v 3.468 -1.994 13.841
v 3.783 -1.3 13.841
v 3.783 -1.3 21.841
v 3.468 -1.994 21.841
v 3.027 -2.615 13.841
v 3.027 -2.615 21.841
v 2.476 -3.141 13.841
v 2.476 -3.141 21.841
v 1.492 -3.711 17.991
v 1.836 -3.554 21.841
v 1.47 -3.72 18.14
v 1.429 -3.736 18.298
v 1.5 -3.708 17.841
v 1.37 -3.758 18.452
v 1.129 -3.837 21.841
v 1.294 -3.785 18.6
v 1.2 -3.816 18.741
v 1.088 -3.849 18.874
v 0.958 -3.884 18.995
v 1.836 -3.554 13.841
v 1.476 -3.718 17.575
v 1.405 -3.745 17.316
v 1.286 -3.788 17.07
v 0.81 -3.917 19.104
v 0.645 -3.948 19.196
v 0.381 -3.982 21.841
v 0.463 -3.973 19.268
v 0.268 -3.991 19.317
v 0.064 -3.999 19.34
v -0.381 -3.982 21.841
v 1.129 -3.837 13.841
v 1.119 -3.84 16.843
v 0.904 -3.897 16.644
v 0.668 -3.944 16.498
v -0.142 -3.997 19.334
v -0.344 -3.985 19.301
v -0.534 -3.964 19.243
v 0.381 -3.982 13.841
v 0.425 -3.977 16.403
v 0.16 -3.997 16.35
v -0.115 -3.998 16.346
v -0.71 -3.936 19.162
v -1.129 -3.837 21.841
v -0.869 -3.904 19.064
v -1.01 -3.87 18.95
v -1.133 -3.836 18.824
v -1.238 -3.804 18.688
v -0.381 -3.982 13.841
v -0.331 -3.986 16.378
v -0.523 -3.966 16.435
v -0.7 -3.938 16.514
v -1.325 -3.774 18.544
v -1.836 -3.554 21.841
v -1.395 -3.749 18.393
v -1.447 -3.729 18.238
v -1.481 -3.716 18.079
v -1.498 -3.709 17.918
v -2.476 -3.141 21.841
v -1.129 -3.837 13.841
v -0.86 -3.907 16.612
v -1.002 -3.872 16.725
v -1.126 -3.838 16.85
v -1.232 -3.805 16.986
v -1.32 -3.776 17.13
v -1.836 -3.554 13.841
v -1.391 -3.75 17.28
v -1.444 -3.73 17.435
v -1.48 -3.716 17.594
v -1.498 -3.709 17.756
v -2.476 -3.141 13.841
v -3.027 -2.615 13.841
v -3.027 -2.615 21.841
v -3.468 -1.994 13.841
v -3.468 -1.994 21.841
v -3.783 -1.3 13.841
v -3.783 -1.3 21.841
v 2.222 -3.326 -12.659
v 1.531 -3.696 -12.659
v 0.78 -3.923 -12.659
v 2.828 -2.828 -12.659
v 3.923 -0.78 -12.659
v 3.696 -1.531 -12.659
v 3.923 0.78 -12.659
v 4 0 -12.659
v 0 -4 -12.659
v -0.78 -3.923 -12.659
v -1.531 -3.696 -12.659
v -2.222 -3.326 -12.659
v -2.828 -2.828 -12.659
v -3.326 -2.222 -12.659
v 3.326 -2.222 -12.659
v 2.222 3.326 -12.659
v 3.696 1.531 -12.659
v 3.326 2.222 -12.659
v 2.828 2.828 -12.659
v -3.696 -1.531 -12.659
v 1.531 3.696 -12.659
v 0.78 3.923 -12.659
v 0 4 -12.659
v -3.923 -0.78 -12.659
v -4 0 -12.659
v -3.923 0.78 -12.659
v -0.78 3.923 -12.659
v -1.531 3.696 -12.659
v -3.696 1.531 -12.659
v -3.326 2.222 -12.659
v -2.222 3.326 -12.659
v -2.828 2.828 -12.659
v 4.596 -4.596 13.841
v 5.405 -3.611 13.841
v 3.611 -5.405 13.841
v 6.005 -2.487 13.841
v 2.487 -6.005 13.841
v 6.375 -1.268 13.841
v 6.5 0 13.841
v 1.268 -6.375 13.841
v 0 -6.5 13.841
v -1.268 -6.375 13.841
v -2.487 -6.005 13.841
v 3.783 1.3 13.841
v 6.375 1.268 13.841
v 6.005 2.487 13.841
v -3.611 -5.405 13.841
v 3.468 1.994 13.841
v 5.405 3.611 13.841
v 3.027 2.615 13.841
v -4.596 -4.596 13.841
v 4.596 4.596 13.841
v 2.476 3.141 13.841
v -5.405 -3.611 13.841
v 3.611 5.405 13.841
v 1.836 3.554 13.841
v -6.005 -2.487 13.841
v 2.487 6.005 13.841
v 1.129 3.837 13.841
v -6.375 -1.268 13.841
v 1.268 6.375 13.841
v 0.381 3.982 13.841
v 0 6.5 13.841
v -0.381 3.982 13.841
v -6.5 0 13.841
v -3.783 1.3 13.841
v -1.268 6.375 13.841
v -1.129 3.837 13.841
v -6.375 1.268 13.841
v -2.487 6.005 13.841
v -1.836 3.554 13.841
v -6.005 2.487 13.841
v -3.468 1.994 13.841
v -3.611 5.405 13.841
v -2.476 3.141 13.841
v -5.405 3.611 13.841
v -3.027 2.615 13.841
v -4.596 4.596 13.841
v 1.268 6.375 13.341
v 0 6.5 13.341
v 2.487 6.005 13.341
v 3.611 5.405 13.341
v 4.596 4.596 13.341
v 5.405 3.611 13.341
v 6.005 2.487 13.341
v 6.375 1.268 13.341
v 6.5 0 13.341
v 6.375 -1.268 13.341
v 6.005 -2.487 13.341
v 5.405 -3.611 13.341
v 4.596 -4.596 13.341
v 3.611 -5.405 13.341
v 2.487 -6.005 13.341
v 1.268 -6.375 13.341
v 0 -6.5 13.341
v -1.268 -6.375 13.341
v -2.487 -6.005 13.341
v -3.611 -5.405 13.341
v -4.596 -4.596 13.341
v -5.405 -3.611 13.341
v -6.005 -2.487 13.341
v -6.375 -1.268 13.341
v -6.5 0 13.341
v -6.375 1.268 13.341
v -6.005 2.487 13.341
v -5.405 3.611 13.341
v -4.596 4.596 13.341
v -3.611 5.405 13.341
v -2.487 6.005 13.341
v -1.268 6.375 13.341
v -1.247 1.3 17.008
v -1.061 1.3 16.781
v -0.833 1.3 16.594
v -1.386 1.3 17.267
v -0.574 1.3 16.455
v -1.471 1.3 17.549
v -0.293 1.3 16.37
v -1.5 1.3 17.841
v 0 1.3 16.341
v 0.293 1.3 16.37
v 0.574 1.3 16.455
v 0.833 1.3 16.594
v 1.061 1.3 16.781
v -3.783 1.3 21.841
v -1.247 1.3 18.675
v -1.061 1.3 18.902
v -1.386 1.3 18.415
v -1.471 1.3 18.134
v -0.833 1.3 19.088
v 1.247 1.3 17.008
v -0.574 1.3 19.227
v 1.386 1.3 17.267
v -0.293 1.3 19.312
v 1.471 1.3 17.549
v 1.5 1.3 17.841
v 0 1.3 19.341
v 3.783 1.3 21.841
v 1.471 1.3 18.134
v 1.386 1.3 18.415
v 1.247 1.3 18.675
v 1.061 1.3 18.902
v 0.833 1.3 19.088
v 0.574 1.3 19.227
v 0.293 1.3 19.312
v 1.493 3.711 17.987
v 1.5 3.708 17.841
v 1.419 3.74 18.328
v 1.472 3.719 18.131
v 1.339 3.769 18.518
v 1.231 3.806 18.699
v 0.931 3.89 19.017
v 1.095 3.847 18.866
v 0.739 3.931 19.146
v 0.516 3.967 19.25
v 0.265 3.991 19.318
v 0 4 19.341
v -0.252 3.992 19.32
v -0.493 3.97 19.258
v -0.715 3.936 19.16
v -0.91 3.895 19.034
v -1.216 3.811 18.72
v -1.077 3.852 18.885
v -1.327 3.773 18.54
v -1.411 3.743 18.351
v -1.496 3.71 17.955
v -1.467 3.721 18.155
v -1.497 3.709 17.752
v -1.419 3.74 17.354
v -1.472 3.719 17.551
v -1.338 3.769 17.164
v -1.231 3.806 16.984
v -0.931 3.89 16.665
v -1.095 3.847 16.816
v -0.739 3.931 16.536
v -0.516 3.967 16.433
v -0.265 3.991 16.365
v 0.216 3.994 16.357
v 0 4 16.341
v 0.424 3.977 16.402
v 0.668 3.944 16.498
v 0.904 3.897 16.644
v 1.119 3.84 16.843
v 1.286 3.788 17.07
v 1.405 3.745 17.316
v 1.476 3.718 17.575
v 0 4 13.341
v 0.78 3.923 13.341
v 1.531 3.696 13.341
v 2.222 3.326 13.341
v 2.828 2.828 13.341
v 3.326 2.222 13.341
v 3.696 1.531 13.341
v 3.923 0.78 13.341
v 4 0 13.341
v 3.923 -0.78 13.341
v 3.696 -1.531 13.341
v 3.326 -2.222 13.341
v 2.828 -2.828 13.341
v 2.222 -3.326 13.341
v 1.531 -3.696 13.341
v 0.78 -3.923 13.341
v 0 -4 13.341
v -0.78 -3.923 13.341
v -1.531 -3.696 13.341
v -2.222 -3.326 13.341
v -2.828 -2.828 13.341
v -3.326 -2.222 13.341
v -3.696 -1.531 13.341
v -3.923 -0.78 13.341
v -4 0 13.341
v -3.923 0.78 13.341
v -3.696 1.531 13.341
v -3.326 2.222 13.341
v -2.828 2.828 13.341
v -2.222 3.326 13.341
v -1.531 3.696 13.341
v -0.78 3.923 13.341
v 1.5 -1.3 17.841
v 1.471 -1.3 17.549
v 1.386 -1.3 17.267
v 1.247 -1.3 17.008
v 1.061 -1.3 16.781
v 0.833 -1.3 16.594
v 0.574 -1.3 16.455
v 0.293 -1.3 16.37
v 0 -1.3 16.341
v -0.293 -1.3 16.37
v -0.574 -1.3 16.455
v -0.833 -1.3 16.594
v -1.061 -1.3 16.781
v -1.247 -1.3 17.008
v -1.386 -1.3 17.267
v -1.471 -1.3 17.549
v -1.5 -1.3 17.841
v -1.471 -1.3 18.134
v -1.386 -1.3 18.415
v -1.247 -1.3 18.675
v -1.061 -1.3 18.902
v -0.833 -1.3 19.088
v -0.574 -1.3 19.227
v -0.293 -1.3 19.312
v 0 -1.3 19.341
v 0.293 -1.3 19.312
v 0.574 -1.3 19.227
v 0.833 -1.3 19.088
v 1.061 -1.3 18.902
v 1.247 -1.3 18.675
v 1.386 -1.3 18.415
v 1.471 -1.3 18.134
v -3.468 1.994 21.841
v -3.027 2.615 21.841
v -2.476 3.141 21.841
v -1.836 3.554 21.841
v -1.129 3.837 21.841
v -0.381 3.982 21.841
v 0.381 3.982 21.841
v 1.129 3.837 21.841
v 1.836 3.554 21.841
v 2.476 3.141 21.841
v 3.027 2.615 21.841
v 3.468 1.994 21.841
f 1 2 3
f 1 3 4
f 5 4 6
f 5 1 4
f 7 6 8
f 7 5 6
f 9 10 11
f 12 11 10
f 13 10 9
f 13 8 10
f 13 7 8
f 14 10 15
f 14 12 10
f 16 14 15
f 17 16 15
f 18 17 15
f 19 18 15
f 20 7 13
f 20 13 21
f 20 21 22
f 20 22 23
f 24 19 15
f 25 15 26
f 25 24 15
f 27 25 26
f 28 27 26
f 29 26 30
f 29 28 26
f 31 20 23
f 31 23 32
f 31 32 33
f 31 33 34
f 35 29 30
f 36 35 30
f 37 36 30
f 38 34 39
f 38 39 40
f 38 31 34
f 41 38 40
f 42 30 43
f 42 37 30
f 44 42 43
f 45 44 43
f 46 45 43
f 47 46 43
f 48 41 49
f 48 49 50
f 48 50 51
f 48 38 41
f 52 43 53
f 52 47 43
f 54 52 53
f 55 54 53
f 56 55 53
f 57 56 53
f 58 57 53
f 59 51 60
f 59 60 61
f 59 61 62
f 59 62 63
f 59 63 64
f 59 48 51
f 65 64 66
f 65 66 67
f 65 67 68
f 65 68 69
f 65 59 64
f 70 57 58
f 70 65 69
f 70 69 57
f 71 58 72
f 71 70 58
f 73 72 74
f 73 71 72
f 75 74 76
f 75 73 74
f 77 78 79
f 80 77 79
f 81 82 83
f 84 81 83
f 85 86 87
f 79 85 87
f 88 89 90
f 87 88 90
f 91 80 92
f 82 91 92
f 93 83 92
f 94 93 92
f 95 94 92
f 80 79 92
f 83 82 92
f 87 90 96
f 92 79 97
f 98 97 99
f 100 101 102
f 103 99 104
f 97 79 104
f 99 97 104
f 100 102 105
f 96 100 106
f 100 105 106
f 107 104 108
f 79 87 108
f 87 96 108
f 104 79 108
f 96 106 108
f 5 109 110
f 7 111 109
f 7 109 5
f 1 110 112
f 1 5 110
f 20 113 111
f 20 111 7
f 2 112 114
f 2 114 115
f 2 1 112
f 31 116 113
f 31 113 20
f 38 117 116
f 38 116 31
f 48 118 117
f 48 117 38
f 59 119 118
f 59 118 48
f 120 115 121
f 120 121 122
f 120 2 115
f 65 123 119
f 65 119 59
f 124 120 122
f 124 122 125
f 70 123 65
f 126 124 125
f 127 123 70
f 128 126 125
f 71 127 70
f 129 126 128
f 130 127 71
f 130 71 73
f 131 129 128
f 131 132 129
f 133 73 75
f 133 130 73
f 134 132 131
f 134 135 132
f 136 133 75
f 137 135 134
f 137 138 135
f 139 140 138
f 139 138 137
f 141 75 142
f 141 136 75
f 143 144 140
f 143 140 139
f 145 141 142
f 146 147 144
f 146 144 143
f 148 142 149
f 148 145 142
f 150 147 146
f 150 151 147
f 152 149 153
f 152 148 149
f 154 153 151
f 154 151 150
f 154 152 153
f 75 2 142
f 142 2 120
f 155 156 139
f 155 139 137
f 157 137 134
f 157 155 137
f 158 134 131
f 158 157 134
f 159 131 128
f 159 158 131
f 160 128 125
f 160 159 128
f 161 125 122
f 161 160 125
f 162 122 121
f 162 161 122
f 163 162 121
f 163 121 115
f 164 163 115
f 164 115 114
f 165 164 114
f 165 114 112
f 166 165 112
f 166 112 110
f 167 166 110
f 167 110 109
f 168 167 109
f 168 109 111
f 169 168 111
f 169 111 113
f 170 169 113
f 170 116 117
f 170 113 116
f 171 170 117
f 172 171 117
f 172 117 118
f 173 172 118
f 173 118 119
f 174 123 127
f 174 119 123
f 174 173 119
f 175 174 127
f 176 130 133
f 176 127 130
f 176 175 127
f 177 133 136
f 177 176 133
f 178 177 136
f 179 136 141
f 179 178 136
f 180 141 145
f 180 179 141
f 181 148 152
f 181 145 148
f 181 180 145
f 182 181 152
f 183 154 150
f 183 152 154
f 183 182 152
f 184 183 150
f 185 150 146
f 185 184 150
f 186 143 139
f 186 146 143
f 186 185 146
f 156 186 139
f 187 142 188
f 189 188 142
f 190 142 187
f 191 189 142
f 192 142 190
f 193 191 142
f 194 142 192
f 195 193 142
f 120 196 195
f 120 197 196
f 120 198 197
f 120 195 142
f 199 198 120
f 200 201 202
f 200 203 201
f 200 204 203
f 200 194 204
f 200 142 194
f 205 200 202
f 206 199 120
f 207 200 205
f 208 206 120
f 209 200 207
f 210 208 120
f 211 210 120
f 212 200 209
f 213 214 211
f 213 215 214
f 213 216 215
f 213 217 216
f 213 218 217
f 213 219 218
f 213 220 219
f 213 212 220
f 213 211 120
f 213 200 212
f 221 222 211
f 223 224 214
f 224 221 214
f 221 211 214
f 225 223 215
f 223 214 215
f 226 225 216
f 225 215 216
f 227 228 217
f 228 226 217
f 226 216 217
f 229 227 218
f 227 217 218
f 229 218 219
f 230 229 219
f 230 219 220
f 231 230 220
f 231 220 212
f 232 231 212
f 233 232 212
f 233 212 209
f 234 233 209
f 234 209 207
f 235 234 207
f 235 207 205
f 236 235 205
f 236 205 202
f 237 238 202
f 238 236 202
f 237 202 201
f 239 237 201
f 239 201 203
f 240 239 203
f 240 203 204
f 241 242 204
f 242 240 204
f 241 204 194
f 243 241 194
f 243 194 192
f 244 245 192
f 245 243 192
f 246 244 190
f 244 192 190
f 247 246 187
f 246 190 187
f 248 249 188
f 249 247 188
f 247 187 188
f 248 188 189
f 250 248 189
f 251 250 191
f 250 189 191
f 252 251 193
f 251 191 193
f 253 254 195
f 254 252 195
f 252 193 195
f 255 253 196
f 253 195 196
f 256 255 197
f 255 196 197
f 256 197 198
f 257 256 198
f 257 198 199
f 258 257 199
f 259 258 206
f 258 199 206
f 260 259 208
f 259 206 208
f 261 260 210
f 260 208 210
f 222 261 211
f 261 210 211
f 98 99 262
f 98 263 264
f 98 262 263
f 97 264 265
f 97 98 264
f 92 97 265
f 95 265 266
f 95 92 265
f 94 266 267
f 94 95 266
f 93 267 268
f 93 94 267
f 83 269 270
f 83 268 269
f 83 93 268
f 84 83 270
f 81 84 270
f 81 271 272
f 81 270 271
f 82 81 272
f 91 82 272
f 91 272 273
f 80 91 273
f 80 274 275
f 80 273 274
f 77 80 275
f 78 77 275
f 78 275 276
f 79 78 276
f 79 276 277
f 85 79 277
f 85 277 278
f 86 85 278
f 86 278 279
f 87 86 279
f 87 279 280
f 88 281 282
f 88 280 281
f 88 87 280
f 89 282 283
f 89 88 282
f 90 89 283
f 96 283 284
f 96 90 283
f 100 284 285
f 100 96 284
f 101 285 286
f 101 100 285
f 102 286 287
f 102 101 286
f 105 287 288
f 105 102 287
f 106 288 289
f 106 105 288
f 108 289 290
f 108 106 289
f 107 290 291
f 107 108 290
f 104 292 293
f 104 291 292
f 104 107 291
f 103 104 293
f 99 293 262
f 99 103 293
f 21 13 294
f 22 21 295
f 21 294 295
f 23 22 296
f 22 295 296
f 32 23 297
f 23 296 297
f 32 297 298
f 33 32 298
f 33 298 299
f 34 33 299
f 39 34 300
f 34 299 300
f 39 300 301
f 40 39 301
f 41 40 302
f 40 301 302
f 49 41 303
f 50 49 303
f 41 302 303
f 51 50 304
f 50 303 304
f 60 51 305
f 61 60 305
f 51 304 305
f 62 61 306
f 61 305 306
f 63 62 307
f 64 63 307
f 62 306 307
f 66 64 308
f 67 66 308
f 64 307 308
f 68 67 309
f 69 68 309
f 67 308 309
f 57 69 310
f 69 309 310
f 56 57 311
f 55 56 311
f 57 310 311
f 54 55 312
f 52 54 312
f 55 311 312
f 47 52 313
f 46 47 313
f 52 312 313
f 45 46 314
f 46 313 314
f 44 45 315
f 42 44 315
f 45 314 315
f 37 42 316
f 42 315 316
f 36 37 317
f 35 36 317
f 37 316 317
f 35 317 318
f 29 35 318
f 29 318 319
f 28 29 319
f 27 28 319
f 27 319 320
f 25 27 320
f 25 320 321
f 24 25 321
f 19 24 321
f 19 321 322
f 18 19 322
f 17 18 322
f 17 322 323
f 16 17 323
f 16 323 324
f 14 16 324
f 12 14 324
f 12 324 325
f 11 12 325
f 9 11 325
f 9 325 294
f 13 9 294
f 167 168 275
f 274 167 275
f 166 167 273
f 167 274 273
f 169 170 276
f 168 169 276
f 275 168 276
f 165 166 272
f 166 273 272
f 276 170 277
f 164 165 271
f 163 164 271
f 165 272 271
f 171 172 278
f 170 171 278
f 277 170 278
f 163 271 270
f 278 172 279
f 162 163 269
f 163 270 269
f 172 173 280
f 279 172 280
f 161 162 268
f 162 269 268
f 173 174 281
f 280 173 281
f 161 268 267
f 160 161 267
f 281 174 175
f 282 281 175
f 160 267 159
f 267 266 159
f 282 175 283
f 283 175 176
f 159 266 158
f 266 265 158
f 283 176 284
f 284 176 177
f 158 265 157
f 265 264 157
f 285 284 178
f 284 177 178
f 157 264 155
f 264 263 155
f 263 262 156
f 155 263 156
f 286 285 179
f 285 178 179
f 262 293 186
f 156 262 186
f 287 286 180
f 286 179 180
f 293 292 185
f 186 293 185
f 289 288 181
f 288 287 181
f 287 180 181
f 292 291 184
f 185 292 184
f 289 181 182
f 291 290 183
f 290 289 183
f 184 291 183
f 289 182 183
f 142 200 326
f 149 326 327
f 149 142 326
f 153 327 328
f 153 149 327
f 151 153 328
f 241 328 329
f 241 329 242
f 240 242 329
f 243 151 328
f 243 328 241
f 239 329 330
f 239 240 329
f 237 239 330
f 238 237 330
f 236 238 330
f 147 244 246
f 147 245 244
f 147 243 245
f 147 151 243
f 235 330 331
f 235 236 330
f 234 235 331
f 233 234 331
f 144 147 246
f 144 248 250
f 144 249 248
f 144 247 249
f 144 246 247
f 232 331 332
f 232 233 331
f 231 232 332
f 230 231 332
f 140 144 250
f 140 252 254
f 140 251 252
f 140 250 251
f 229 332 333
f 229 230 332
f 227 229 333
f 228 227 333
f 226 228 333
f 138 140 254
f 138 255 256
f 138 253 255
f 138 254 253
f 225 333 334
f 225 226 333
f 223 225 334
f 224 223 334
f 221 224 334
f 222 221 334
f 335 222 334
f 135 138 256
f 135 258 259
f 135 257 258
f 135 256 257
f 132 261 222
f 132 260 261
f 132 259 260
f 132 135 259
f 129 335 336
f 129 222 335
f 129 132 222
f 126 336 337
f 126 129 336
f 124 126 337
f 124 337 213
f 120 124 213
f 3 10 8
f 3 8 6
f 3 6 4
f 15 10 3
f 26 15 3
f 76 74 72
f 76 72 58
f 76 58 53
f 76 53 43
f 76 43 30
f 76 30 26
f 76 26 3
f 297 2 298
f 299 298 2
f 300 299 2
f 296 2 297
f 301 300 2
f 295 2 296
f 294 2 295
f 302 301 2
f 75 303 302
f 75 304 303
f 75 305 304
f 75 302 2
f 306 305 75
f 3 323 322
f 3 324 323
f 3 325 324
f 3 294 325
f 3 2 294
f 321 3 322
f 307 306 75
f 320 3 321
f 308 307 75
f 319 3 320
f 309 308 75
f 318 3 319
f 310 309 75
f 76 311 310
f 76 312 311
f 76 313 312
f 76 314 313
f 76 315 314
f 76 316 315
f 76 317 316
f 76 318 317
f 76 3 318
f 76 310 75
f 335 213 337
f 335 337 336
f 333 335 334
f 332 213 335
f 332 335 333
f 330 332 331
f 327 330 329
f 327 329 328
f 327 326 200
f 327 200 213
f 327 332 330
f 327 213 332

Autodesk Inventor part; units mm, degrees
ref_plane "YZ Plane" through (0, 0, 0) normal (1, 0, 0) x (0, 1, 0)
ref_plane "XZ Plane" through (0, 0, 0) normal (0, 1, 0) x (-1, 0, 0)
ref_plane "XY Plane" through (0, 0, 0) normal (0, 0, 1) x (1, 0, 0)
sketch "Sketch2" plane through (0, 0, 0) normal (1, 0, 0) x (0, 1, 0)
  line L0 (0, 21.8412) -> (4, 21.8412)
  line L1 (4, 21.8412) -> (4, 13.8412)
  line L2 (4, 13.8412) -> (6.5, 13.8412)
  line L3 (6.5, 13.8412) -> (6.5, 13.3412)
  line L4 (6.5, 13.3412) -> (4, 13.3412)
  line L5 (4, 13.3412) -> (4, -12.6588)
  line L6 (4, -12.6588) -> (0, -12.6588)
  line L7 (0, -12.6588) -> (0, 21.8412)
  point P0 (0, 0)
  dimension "d0" = 4
  dimension "d1" = 8
  dimension "d2" = 2.5
  dimension "d3" = 0.5
  dimension "d4" = 26
revolve "Revolution1" add sketch "Sketch2" angle 360 about axis through (0, 0, -12.6588) along (0, 0, 1)
sketch "Sketch3" plane through (0, 0, 21.8412) normal (0, 0, 1) x (1, 0, 0)
  line L0 (7.5, -1.3) -> (-7.5, -1.3)
  line L1 (-7.5, -1.3) -> (-7.5, 1.3)
  line L2 (-7.5, 1.3) -> (7.5, 1.3)
  line L3 (7.5, 1.3) -> (7.5, -1.3)
  circle A0 centre (0, 0) radius 4 projected
  line L4 (7.5, -1.3) -> (-7.5, 1.3) construction
  line L5 (-7.5, -1.3) -> (7.5, 1.3) construction
  point P0 (3.7829, 1.3)
  point P1 (-3.7829, 1.3)
  point P2 (-3.7829, -1.3)
  point P3 (3.7829, -1.3)
  dimension "d14" = 2.6
  dimension "d15" = 15
extrude "Extrusion1" cut sketch "Sketch3" against normal blind 8 contours L0 A0 L2
sketch "Sketch5" plane through (-3.7829, -1.3, 21.8412) normal (0, 1, 0) x (1, 0, 0)
  circle A0 centre (3.7829, 4) radius 1.5
  line L0 (7.5657, 0) -> (0, 0) projected
  line L1 (7.5657, 0) -> (0, 0) projected
  line L2 (7.5657, 0) -> (0, 0) projected
  line L3 (7.5657, 8) -> (7.5657, 0) projected
  line L4 (7.5657, 0) -> (0, 0) projected
  line L5 (0, 0) -> (0, 8) projected
  line L6 (7.5657, 8) -> (0, 8) projected
  point P0 (3.7829, 21.8412)
  dimension "d8" = 4
  dimension "d9" = 3.7829
  dimension "d10" = 3.7829
  dimension "d13" = 3
extrude "Extrusion2" cut sketch "Sketch5" along normal through all both and the other way through all contours A0
equation "\"d9\" = d10"
properties part number "pole"
